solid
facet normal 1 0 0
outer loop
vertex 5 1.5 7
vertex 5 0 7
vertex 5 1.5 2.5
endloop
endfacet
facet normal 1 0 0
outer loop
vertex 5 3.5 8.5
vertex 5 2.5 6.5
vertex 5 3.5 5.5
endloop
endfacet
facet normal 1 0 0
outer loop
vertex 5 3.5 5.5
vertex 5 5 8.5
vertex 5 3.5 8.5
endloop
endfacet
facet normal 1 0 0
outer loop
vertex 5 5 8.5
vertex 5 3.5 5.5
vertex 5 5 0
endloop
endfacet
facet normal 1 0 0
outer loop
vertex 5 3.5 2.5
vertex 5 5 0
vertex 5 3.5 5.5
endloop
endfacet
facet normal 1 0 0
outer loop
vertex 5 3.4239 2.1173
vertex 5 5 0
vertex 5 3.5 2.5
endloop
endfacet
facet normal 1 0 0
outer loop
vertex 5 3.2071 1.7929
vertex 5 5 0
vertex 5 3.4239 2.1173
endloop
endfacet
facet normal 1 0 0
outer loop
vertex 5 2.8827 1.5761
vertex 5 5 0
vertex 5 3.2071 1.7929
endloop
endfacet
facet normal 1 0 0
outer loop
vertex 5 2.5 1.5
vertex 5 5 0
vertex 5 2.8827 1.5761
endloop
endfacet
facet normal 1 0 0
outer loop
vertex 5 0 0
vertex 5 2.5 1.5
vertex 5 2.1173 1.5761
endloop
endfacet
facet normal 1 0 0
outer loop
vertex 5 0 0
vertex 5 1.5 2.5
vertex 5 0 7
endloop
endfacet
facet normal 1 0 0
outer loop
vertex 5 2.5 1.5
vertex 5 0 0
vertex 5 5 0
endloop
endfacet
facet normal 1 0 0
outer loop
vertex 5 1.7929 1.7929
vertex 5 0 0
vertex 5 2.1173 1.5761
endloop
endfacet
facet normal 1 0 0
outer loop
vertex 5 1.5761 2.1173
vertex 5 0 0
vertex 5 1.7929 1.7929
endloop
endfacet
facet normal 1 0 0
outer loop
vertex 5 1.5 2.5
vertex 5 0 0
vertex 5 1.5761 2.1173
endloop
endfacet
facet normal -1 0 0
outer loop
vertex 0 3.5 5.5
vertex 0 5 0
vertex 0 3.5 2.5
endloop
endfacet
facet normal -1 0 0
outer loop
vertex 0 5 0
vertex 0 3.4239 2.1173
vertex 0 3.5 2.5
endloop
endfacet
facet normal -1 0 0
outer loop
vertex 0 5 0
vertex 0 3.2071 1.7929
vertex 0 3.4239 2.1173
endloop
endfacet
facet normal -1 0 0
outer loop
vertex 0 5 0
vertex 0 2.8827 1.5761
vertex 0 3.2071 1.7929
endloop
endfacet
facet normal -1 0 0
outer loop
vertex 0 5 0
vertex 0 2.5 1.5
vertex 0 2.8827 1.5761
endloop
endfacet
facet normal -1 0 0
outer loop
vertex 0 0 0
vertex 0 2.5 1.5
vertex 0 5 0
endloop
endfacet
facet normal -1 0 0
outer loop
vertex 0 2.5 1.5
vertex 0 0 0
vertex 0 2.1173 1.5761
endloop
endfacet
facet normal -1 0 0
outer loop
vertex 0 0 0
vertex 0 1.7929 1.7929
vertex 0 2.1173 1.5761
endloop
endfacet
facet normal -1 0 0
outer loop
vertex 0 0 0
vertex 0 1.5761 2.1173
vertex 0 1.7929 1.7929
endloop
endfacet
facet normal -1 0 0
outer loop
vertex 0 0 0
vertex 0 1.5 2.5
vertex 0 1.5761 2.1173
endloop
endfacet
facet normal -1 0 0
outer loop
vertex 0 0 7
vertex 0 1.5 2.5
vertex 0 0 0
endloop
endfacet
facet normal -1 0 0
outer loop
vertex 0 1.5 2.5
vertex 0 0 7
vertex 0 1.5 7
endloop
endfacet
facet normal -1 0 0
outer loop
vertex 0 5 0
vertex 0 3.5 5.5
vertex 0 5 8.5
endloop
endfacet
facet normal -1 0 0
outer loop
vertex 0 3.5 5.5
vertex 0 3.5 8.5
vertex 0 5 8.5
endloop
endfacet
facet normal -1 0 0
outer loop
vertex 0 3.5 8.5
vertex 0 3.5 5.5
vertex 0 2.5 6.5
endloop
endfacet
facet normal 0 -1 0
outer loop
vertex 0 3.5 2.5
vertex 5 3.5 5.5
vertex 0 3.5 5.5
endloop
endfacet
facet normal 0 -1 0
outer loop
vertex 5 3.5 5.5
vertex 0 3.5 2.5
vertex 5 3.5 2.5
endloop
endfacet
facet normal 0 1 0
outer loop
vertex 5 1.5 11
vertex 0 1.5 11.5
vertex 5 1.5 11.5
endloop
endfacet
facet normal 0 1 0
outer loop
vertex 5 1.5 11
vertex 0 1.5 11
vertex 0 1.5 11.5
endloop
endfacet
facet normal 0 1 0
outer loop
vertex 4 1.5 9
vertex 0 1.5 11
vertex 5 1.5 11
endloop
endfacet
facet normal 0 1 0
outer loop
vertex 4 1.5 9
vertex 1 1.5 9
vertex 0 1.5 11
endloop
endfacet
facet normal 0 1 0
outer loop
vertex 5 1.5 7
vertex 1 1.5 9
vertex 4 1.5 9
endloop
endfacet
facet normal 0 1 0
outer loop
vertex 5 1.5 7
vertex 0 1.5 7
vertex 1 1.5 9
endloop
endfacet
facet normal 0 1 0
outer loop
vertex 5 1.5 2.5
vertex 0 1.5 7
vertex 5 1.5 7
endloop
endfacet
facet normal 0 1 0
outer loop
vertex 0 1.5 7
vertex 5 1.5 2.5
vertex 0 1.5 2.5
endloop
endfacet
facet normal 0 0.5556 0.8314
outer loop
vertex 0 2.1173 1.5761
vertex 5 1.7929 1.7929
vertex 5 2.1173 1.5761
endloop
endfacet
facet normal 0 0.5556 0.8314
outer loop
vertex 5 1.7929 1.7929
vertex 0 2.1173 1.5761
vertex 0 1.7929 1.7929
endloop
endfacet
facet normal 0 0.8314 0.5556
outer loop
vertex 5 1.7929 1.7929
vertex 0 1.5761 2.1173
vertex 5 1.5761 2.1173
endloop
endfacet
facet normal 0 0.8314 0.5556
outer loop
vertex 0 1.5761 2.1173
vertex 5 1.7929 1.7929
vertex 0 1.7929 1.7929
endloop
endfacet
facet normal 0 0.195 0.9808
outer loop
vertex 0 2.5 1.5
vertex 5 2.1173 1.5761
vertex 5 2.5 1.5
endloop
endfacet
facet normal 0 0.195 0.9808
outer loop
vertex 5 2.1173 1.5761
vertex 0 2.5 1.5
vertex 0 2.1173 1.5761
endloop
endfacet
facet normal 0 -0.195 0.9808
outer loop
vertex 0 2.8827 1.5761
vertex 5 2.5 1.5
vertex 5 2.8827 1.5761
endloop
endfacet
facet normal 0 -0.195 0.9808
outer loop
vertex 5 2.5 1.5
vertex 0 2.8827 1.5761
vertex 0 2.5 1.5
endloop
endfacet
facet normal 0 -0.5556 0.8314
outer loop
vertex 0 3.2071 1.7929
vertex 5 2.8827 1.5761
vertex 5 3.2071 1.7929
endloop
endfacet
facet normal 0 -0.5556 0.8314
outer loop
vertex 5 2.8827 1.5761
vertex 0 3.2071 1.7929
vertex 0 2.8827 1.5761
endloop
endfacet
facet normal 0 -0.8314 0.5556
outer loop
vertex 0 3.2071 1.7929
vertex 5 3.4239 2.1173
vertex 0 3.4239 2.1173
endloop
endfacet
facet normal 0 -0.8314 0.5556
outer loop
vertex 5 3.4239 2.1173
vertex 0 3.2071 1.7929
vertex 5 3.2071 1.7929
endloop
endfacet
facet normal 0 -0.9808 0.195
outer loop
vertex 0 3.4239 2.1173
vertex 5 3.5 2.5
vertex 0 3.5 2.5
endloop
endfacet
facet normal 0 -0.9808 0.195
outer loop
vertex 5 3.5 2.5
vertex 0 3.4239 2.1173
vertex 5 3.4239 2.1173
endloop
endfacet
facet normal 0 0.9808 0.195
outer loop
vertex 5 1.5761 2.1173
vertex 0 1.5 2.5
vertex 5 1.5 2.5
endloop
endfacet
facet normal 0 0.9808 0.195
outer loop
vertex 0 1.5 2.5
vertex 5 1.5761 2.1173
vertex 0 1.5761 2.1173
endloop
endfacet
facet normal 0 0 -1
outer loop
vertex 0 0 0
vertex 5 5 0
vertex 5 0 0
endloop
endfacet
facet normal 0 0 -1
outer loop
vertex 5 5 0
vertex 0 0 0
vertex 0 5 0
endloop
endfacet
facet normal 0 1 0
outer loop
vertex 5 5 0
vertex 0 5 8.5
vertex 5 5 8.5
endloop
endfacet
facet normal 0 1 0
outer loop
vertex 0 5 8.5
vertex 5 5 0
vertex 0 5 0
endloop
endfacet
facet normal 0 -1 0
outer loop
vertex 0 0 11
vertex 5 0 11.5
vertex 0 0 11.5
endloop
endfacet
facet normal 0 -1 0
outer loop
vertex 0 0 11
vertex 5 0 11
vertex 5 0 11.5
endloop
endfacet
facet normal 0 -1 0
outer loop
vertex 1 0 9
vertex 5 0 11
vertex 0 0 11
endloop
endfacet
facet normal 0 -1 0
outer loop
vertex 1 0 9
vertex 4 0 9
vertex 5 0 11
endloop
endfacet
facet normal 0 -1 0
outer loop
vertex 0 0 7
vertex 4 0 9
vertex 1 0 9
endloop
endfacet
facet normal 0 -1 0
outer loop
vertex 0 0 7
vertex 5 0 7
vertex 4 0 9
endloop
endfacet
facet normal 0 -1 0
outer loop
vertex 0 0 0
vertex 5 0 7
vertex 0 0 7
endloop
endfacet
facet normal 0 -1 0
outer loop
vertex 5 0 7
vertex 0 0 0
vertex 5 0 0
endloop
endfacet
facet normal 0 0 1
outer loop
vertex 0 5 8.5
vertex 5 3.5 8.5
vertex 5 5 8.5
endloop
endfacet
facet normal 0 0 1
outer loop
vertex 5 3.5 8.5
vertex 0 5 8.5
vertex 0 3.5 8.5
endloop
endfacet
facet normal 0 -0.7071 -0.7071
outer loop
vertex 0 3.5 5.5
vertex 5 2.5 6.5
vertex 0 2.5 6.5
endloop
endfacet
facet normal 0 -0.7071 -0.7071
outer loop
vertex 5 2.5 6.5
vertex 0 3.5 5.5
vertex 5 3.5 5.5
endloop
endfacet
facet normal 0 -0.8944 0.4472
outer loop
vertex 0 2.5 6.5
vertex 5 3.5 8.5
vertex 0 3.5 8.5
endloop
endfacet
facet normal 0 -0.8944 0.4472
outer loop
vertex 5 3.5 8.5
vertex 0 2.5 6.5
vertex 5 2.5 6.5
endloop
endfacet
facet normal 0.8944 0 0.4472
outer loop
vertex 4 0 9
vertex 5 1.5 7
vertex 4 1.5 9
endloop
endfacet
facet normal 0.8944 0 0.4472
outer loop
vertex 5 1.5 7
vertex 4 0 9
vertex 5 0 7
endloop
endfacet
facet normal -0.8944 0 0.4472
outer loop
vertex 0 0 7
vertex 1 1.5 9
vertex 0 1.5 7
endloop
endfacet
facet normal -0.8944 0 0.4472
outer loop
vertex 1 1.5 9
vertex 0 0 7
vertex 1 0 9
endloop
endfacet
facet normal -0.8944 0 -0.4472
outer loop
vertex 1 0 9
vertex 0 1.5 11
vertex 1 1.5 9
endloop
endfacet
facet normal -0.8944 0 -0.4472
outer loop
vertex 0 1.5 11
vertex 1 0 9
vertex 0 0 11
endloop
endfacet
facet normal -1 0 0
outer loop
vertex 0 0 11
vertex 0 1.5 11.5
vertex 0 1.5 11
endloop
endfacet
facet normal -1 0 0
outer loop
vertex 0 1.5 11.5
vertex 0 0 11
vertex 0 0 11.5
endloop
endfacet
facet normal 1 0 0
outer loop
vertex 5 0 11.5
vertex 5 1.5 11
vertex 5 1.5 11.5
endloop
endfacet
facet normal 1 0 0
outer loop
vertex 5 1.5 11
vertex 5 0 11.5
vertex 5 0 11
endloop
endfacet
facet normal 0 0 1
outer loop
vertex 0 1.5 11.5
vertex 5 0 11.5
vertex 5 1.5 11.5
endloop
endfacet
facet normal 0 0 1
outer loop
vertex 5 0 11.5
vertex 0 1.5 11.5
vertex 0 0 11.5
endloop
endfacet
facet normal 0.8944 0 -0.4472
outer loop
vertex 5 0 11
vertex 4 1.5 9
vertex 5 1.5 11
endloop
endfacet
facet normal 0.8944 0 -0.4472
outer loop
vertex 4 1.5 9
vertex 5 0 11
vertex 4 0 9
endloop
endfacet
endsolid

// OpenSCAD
// file: clipComponent.scad
// Single Hook Upright Clip Component 
EPSILON = 0.01; // For padding negative volumes to fix z-fighting

module hookHead(hookHeight, hookProtrusion, hookBottomAngle, thickness) {
    linear_extrude(height=clipWidth)
        polygon(points=[[0,0], [0,hookHeight],
            [hookProtrusion, hookProtrusion / tan(hookBottomAngle)]]
        );
}

module cornerReinforcement(spaceBetweenWalls, clipWidth) {
    difference() {
        cube([clipWidth, spaceBetweenWalls, spaceBetweenWalls/2]);
        translate([-EPSILON, spaceBetweenWalls/2, spaceBetweenWalls/2])
            rotate([0, 90, 0])
            scale([1, 1, 1 + (2 * EPSILON)])
            cylinder(h=clipWidth, r=spaceBetweenWalls/2);
    }
}

module clipComponent(clipParmList) {
    clipWidth = clipParmList[0];
    frontWallHeight = clipParmList[1];
    frontWallThickness = clipParmList[2];
    spaceBetweenWalls = clipParmList[3];
    bottomThickness = clipParmList[4];
    backWallHeight = clipParmList[5];
    backWallThickness = clipParmList[6];
    hookHeight = clipParmList[7];
    hookProtusion = clipParmList[8];
    hookBottomAngle = clipParmList[9];
    
    // Front wall
    cube([clipWidth, frontWallThickness + spaceBetweenWalls + backWallThickness, bottomThickness]);
    // Bottom
    translate([0, 0, bottomThickness])
        cube([clipWidth, frontWallThickness, frontWallHeight]);
    // Back wall
    translate([0, frontWallThickness + spaceBetweenWalls, bottomThickness])
        cube([clipWidth, backWallThickness, backWallHeight]);
    // Add rounded corner reinforcement for wall bending during clip insertion
    translate([0, frontWallThickness, bottomThickness])
        cornerReinforcement(spaceBetweenWalls, clipWidth);
    // Hook head
    translate([clipWidth, frontWallThickness + spaceBetweenWalls, backWallHeight + bottomThickness - hookHeight])
        rotate([90, 0, -90])
        hookHead(hookHeight, hookProtrusion, hookBottomAngle, clipWidth);
}

// Parameters
$fn = 16; // global var controlling number of vertices in a cylinder

clipWidth = 5;

frontWallHeight = 5;
frontWallThickness = 1.5;

spaceBetweenWalls = 2;

bottomThickness = 1.5;
backWallHeight = 7;
backWallThickness = 1.5;

hookHeight = 3; // how much wall space the hook head occupies
hookProtrusion = 1; // how far out the hook head extends
hookBottomAngle = 45; // bottom angle of the hook off the wall (angle > 45 degrees may need supports)

clipParmList = [
    clipWidth, frontWallHeight, frontWallThickness, spaceBetweenWalls, bottomThickness,
    backWallHeight, backWallThickness, hookHeight, hookProtrusion, hookBottomAngle
];

clipComponent(clipParmList);
// main file
// Rubber Band Holder

use <clipComponent.scad>;

module halfDoubleNotch(doubleNotchParmList) {
    doubleNotchWidth = doubleNotchParmList[0];
    doubleNotchThickness = doubleNotchParmList[1];
    doubleNotchMidWidth = doubleNotchParmList[2];
    doubleNotchBorderHeight = doubleNotchParmList[3];
    doubleNotchMiddleHeight = doubleNotchParmList[4];
    
    notchAngle = atan((doubleNotchWidth - doubleNotchMidWidth) / doubleNotchMidWidth);
    assert(notchAngle <= 45, "Notch middle too small - notch angle must be less than 45 degrees");
    assert(doubleNotchMidWidth <= doubleNotchWidth, "Notch middle must be smaller than ends");
    
    hull() {
        cube([doubleNotchWidth, doubleNotchThickness, doubleNotchBorderHeight]);
        translate([doubleNotchWidth/2 - doubleNotchMidWidth/2, 0, doubleNotchBorderHeight])
            cube([doubleNotchMidWidth, doubleNotchThickness, doubleNotchMiddleHeight/2]);
    }
}

module doubleNotch(doubleNotchParmList) {
    doubleNotchBorderHeight = doubleNotchParmList[3];
    doubleNotchMiddleHeight = doubleNotchParmList[4];
    
    halfDoubleNotch(doubleNotchParmList);
    translate([0,0, 2 * doubleNotchBorderHeight + doubleNotchMiddleHeight])
        mirror([0,0,1])
        halfDoubleNotch(doubleNotchParmList);
}

module rubberBandHolderClip(doubleNotchParmList, clipParmList) {
    frontWallHeight = clipParmList[1];
    bottomThickness = clipParmList[4];
    
    totalFrontWallHeight = frontWallHeight + bottomThickness;
    clipComponent(clipParmList);
    translate([0, 0, totalFrontWallHeight])
        doubleNotch(doubleNotchParmList);
}

// Clip Component Parameters
clipWidth = 5;

frontWallHeight = 5;
frontWallThickness = 1.5;

spaceBetweenWalls = 2;
bottomThickness = 1.5;

backWallHeight = 7;
backWallThickness = 1.5;

hookHeight = 3; // how much wall space the hook head occupies
hookProtrusion = 1; // how far out the hook head extends
hookBottomAngle = 45; // bottom angle of the hook off the wall (angle > 45 degrees may need supports)

clipParmList = [
    clipWidth, frontWallHeight, frontWallThickness, spaceBetweenWalls, bottomThickness,
    backWallHeight, backWallThickness, hookHeight, hookProtrusion, hookBottomAngle
];

// Double Notch Parameters
doubleNotchWidth = clipWidth;
doubleNotchThickness = frontWallThickness;
doubleNotchMidWidth = 3; // inner width of notch

doubleNotchBorderHeight = 0.5; // height of top and bottom borders
doubleNotchMiddleHeight = 4; // height between borders

doubleNotchParmList = [
    doubleNotchWidth, doubleNotchThickness, doubleNotchMidWidth, 
    doubleNotchBorderHeight, doubleNotchMiddleHeight
];

rubberBandHolderClip(doubleNotchParmList, clipParmList);
